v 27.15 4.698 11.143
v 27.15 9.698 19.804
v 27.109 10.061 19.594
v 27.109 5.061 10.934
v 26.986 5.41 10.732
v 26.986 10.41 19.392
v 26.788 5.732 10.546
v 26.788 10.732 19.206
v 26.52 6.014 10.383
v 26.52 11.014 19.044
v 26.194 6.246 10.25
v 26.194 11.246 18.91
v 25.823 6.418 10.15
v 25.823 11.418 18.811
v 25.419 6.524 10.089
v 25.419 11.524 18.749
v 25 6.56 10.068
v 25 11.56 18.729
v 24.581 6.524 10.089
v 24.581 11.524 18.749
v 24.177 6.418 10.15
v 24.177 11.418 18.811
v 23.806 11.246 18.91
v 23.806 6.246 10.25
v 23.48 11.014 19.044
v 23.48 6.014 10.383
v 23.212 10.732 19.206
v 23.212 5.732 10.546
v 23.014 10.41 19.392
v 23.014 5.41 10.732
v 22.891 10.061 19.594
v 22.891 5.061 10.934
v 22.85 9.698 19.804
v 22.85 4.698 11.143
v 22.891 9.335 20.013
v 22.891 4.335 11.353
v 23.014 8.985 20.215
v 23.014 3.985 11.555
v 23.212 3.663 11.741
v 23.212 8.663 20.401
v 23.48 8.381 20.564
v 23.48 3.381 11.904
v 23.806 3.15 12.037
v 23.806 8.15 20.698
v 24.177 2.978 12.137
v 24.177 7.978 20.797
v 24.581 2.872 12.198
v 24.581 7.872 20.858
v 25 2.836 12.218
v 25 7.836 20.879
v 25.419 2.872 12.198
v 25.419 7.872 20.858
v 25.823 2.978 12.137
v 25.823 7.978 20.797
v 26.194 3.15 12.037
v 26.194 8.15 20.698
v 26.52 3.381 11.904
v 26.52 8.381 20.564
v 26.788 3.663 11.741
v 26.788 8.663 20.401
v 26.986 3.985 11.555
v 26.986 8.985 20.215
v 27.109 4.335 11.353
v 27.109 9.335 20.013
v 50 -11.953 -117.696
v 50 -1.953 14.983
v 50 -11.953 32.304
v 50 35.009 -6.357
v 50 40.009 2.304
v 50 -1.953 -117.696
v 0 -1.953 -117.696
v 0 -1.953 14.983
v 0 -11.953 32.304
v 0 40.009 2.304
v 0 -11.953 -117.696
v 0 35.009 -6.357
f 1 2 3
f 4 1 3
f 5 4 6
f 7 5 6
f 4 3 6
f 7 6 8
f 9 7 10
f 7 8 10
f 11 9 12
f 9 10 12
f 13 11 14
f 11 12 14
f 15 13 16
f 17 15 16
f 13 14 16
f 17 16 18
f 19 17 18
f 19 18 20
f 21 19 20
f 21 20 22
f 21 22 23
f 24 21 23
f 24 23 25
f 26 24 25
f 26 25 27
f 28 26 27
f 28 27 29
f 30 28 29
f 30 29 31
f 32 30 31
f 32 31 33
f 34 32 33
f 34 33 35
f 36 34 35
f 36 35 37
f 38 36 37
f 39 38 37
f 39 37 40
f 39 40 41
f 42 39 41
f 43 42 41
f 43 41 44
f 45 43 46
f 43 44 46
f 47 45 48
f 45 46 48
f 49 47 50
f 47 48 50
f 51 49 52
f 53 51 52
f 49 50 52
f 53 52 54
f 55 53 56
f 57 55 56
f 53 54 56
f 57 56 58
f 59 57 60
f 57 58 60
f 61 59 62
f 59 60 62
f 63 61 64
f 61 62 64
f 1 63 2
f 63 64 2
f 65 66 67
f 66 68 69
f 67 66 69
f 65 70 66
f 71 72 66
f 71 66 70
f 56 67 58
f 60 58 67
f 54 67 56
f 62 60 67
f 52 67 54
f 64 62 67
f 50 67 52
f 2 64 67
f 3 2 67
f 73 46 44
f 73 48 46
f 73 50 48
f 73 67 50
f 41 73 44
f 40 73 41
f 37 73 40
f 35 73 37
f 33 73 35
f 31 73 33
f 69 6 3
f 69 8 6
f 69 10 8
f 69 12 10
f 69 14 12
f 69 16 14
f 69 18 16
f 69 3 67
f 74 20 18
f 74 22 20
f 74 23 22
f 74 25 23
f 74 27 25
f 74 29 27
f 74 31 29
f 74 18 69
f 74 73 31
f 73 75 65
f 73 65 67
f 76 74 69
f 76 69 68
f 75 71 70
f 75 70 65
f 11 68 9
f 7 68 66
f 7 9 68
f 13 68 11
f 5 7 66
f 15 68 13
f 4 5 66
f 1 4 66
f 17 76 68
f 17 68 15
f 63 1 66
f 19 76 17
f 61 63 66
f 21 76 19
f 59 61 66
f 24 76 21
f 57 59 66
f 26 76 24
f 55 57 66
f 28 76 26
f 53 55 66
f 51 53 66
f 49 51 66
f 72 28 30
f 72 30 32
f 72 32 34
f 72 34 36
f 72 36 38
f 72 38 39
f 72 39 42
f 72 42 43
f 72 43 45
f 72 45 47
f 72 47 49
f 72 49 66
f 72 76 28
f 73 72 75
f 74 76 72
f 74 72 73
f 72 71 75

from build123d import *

# Parameters (mm, degrees)
EXTRUDE_1_DEPTH     = 50
SKETCH_2_R          = 2.15
CUT_EXTRUDE_1_DEPTH = 18


with BuildPart() as part:
    # 草图1 → 凸台-拉伸1 (new body)
    with BuildSketch(Plane(origin=(0, 0, 0), x_dir=(0, 0, -1), z_dir=(1, 0, 0))):
        Polygon((117.696324268, -1.952846431), (117.696324268, -11.952846431), (-32.303675732, -11.952846431), (-2.303675732, 40.008677796), (6.356578306, 35.008677796), (-14.983167656, -1.952846431), align=None)
    extrude(amount=EXTRUDE_1_DEPTH)

    # 草图2 → 切除-拉伸1 (cut)
    with BuildSketch(Plane(origin=(0, 10.999690302, 19.052022471), x_dir=(1, 0, 0), z_dir=(0, 0.5, 0.866025404))):
        with Locations((25, -1.503306522)):
            Circle(SKETCH_2_R)
    extrude(amount=-CUT_EXTRUDE_1_DEPTH, mode=Mode.SUBTRACT)


solid = part.part
